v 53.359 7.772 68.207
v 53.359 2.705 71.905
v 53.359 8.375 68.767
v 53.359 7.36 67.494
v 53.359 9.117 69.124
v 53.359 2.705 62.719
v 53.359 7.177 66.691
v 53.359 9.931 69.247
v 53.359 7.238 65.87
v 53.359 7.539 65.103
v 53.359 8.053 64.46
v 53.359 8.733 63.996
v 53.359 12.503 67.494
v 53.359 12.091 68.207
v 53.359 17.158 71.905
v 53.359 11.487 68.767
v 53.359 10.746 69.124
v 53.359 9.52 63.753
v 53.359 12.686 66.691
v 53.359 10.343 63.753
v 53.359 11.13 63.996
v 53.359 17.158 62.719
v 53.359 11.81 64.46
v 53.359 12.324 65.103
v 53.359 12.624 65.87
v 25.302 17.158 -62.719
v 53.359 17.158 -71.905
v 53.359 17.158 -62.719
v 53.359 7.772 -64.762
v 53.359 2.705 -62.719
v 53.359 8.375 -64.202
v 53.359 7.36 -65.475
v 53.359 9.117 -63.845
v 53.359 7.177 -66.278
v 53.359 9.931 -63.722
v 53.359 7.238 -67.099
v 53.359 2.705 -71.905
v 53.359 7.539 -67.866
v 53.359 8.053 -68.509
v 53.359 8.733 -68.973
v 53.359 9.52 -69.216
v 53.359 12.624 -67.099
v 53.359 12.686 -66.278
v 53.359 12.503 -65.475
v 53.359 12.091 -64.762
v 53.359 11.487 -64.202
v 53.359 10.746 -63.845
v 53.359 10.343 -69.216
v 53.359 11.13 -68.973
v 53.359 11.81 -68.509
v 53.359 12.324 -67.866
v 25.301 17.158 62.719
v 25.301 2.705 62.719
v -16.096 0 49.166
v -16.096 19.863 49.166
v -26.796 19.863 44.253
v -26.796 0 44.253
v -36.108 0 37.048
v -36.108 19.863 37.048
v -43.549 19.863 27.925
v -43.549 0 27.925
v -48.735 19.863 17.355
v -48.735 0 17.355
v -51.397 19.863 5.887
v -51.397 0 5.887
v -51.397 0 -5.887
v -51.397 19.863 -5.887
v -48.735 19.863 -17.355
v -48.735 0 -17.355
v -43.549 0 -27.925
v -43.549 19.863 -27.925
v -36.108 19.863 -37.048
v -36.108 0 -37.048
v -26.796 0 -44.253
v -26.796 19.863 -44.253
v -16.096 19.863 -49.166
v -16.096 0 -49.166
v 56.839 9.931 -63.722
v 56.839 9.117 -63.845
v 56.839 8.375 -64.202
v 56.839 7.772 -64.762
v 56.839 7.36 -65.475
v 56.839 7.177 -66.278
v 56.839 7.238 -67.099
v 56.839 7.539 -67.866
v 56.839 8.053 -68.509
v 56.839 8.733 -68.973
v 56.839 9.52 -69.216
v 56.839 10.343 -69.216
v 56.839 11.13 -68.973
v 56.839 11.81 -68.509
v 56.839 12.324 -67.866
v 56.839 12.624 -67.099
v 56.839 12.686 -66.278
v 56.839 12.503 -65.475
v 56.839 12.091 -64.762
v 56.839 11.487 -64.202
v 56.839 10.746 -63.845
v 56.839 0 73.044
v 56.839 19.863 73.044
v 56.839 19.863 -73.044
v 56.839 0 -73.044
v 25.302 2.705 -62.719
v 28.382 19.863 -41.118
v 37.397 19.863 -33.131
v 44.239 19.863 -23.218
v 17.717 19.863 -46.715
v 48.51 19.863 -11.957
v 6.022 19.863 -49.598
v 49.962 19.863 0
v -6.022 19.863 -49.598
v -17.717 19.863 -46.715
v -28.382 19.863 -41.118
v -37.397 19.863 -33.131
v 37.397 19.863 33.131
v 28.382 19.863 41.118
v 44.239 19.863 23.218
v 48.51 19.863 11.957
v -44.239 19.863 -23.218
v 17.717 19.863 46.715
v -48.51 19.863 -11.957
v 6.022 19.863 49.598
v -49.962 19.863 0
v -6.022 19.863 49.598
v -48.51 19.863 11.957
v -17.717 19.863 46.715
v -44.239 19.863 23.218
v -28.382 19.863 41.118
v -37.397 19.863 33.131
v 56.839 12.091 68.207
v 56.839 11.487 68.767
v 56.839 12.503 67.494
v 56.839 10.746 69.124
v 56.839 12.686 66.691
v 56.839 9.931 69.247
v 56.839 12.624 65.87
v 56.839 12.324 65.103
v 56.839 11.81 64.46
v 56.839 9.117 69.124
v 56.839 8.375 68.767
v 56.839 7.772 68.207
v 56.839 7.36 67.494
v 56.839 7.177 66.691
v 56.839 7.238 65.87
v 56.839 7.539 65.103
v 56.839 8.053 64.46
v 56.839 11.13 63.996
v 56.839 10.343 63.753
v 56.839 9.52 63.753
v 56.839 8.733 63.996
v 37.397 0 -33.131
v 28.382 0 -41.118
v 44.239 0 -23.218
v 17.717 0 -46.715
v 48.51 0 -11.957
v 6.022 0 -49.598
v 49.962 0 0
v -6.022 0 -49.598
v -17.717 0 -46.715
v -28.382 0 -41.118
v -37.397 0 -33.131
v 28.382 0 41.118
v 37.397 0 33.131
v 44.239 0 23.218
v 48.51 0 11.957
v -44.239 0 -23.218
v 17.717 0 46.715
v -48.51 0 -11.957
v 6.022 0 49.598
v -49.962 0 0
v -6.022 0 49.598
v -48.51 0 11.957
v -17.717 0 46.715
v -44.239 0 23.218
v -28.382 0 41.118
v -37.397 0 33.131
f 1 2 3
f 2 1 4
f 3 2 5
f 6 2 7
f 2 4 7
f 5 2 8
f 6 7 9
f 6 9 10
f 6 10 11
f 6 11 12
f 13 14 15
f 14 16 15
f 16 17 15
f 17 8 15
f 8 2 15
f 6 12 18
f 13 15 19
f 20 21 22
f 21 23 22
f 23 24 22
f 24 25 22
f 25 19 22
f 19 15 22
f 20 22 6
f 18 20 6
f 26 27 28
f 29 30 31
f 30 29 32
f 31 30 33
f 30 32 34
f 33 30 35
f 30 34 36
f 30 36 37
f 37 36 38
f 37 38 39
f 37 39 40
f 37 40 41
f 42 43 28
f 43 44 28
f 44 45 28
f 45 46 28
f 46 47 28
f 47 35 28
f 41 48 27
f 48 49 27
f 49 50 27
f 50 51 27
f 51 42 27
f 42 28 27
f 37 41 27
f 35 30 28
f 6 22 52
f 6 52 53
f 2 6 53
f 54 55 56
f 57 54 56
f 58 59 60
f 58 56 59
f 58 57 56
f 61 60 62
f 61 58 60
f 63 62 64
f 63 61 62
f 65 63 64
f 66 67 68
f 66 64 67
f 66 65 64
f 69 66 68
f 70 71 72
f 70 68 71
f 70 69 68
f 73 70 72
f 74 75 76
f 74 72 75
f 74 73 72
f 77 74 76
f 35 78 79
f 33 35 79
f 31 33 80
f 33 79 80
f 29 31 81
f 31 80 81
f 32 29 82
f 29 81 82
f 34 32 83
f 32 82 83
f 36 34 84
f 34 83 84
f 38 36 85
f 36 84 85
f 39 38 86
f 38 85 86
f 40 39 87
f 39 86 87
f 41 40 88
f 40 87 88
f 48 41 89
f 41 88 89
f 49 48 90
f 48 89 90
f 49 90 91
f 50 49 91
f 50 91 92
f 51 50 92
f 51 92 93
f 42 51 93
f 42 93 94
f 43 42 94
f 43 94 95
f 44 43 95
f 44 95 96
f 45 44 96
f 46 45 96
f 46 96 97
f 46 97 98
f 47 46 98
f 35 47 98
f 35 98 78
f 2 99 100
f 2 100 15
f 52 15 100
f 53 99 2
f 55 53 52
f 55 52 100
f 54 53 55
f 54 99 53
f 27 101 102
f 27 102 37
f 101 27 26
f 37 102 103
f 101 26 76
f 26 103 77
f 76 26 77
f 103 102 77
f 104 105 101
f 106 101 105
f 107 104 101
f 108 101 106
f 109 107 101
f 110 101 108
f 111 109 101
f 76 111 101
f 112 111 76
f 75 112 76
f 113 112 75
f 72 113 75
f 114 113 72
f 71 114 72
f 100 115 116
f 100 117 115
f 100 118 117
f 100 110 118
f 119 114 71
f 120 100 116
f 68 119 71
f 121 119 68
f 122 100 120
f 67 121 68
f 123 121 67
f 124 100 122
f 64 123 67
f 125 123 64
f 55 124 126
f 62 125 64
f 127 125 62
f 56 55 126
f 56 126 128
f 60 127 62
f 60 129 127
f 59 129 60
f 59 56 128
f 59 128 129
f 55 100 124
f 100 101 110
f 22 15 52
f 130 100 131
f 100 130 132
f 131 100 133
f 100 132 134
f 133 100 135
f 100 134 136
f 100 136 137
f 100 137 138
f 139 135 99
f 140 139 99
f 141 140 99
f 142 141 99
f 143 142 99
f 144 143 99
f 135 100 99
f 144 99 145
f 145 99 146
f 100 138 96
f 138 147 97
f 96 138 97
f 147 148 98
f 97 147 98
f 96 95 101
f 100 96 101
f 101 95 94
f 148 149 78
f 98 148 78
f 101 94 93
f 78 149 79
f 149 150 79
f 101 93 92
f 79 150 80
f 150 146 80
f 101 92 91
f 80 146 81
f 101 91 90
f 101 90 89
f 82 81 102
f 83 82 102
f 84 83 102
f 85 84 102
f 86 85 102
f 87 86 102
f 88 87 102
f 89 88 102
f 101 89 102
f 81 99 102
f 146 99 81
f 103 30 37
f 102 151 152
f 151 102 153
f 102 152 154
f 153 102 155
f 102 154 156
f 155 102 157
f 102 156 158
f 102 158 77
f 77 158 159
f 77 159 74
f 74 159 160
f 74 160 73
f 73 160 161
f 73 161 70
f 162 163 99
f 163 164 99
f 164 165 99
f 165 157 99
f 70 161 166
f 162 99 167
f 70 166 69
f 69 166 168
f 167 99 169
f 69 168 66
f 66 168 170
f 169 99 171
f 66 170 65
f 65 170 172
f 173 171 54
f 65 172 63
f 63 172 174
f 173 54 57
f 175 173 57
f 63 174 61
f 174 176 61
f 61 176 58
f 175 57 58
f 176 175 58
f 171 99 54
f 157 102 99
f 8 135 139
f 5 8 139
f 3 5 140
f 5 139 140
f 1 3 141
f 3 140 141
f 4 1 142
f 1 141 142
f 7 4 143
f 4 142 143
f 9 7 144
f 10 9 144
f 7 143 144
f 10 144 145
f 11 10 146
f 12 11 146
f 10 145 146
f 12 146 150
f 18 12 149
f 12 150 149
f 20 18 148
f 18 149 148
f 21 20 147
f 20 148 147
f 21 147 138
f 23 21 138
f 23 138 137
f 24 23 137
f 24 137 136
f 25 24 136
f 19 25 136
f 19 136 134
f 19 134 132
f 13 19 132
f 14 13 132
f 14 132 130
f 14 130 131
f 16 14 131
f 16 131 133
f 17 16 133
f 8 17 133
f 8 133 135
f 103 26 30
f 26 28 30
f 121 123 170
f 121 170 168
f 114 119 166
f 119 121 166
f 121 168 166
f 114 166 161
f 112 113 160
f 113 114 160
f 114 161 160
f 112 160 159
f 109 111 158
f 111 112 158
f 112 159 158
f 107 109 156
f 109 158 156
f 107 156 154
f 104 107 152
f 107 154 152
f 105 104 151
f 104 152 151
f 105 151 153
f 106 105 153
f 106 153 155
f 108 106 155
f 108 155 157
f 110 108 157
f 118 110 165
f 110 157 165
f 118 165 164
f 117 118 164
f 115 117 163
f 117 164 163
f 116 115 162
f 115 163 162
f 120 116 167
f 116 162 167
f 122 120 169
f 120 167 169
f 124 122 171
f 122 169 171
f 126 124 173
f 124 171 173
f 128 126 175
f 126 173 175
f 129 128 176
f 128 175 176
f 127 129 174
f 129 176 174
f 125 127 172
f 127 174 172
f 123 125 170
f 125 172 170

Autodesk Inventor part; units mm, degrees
ref_plane "YZ Plane" through (0, 0, 0) normal (1, 0, 0) x (0, 1, 0)
ref_plane "XZ Plane" through (0, 0, 0) normal (0, 1, 0) x (-1, 0, 0)
sketch "Sketch1" plane through (0, 0, 0) normal (0, 1, 0) x (-1, 0, 0)
  circle A0 centre (0, 0) radius 49.9618
  arc A1 (16.0964, -49.1656) -> (16.0964, 49.1656) centre (0, 0) ccw
  line L0 (-56.8389, 73.044) -> (-56.8388, -73.0441)
  line L1 (-56.8388, 0) -> (0, 0) construction
  line L2 (-56.8389, 73.044) -> (16.0964, 49.1656)
  line L3 (-56.8388, -73.0441) -> (16.0964, -49.1656)
  line L4 (-51.7335, 42.7443) -> (-51.7334, -42.7443) construction
  dimension "d0" = 99.9236
  dimension "d1" = 103.4669
  dimension "d2" = 146.0881
  dimension "d3" = 5.1054
extrude "Extrusion1" add sketch "Sketch1" along normal blind 19.8628
ref_plane "Work Plane1" through (53.3591, 0, 73.044) normal (1, 0, 0) x (0, 0, -1)
sketch "Sketch2" plane through (53.3591, 0, 73.044) normal (1, 0, 0) x (0, 0, -1)
  line L0 (146.0881, 0) -> (146.0881, 19.8628) construction
  line L1 (146.0881, 19.8628) -> (122.2096, 19.8628) construction
  line L2 (146.0881, 0) -> (122.2096, 0) construction
  line L3 (23.8785, 19.8628) -> (0, 19.8628) construction
  line L4 (23.8785, 0) -> (0, 0) construction
  line L5 (0, 0) -> (0, 19.8628) construction
  line L6 (23.8785, 0) -> (23.8785, 19.8628) construction
  line L7 (122.2096, 0) -> (122.2096, 19.8628) construction
  line L8 (146.0881, 17.1577) -> (135.763, 17.1577)
  line L9 (135.763, 17.1577) -> (135.763, 2.7051)
  line L10 (135.763, 2.7051) -> (146.0881, 2.7051)
  line L11 (146.0881, 2.7051) -> (146.0881, 17.1577)
  line L12 (0, 17.1577) -> (10.3251, 17.1577)
  line L13 (10.3251, 17.1577) -> (10.3251, 2.7051)
  line L14 (10.3251, 2.7051) -> (0, 2.7051)
  line L15 (0, 2.7051) -> (0, 17.1577)
  point P0 (73.044, 0)
  dimension "d7" = 2.7051
  dimension "d8" = 2.7051
  dimension "d19" = 10.3251
extrude "Extrusion2" cut sketch "Sketch2" against normal blind 76.2
sketch "Sketch3" plane through (53.3591, 0, 73.044) normal (1, 0, 0) x (0, 0, -1)
  line L0 (139.5285, 9.9314) -> (6.5596, 9.9314) construction
  line L1 (73.044, 0) -> (73.044, 9.9314) construction
  line L2 (135.763, 17.1577) -> (135.763, 2.7051) construction
  line L3 (144.9488, 17.1577) -> (135.763, 17.1577) construction
  line L4 (10.3251, 17.1577) -> (1.1393, 17.1577) construction
  line L5 (144.9488, 17.1577) -> (135.763, 17.1577) construction
  point P0 (73.044, 4.9657)
  point P1 (135.763, 9.9314)
  dimension "Cap_Mount_Hole_Spacing" = 132.969
hole "Hole1" at (53.359, 9.9314, -66.4845) at (53.3591, 9.9314, 66.4845) direction (1, 0, 0) diameter 5.5245 end through all clearance for "Socket Head Cap Screw" size "#10" standard "Ansi Unified Screw Threads"
equation "\"d0\" = Diameter"
equation "\"d8\" = d7"
equation "\"Diameter\" = 99.9236"
properties part number "Cap_Mount" material "Polycarbonate, Clear"
